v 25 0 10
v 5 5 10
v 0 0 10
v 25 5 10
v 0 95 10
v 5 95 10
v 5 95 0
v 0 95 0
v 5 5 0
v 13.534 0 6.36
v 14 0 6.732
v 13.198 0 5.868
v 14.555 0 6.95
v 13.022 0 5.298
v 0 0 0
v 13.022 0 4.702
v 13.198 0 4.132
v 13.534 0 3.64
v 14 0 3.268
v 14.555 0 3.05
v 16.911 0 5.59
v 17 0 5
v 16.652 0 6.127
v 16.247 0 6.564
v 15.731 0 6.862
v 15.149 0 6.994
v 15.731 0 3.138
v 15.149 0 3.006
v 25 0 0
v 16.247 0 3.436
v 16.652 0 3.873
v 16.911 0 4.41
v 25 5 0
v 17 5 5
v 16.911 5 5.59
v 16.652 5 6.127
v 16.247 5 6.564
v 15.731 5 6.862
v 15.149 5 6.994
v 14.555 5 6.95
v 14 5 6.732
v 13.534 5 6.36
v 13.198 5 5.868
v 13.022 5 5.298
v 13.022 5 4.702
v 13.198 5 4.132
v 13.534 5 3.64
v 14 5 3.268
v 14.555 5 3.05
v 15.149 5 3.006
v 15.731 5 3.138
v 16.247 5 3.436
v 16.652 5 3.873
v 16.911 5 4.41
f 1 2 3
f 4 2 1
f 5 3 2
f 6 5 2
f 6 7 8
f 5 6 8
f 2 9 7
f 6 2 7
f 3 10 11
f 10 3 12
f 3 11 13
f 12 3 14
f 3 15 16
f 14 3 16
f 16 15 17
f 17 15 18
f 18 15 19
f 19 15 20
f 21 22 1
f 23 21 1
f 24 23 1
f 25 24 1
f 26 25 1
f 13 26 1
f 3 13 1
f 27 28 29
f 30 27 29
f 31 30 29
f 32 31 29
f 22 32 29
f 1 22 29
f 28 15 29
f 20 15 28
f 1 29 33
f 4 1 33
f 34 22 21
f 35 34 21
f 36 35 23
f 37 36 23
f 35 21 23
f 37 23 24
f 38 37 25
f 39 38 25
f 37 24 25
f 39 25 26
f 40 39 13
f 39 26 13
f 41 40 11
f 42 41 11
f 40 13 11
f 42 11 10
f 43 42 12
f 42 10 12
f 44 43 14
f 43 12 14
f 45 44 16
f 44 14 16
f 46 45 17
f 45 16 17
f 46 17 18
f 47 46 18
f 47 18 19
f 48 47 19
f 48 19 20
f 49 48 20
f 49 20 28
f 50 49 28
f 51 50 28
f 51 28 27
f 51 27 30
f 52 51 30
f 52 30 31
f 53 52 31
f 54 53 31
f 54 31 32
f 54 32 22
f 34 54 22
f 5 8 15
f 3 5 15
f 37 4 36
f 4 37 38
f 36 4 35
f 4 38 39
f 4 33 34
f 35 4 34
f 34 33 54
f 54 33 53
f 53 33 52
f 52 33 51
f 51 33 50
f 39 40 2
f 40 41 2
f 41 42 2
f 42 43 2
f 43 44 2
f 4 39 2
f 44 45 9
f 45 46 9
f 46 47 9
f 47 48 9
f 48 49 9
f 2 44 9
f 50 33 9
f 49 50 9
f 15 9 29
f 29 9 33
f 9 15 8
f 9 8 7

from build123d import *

# Parameters (mm, degrees)
PAD_DEPTH   = 10
SKETCH001_R = 2
HOLE_DEPTH  = 23.798279
HOLE_TIPS_R = 2


with BuildPart() as part:
    # Sketch → Pad (new body)
    with BuildSketch(Plane.XY):
        Polygon((0, 95), (0, 0), (25, 0), (25, 5), (5, 5), (5, 95), align=None)
    extrude(amount=PAD_DEPTH)

    # Sketch001 (on Face2 of Pad) → Hole (cut)
    with BuildSketch(Plane.XZ):
        with Locations((15, 5)):
            Circle(SKETCH001_R)
    extrude(amount=-HOLE_DEPTH, mode=Mode.SUBTRACT)

    # Hole tips → Hole tip 1 section 0
    with BuildSketch(Plane.XZ.offset(-23.798279), mode=Mode.PRIVATE) as hole_tip_1_s0:
        with Locations((15, 5)):
            Circle(HOLE_TIPS_R)
    loft([hole_tip_1_s0.sketch, Vertex(15, 25, 5)], mode=Mode.SUBTRACT)


solid = part.part
